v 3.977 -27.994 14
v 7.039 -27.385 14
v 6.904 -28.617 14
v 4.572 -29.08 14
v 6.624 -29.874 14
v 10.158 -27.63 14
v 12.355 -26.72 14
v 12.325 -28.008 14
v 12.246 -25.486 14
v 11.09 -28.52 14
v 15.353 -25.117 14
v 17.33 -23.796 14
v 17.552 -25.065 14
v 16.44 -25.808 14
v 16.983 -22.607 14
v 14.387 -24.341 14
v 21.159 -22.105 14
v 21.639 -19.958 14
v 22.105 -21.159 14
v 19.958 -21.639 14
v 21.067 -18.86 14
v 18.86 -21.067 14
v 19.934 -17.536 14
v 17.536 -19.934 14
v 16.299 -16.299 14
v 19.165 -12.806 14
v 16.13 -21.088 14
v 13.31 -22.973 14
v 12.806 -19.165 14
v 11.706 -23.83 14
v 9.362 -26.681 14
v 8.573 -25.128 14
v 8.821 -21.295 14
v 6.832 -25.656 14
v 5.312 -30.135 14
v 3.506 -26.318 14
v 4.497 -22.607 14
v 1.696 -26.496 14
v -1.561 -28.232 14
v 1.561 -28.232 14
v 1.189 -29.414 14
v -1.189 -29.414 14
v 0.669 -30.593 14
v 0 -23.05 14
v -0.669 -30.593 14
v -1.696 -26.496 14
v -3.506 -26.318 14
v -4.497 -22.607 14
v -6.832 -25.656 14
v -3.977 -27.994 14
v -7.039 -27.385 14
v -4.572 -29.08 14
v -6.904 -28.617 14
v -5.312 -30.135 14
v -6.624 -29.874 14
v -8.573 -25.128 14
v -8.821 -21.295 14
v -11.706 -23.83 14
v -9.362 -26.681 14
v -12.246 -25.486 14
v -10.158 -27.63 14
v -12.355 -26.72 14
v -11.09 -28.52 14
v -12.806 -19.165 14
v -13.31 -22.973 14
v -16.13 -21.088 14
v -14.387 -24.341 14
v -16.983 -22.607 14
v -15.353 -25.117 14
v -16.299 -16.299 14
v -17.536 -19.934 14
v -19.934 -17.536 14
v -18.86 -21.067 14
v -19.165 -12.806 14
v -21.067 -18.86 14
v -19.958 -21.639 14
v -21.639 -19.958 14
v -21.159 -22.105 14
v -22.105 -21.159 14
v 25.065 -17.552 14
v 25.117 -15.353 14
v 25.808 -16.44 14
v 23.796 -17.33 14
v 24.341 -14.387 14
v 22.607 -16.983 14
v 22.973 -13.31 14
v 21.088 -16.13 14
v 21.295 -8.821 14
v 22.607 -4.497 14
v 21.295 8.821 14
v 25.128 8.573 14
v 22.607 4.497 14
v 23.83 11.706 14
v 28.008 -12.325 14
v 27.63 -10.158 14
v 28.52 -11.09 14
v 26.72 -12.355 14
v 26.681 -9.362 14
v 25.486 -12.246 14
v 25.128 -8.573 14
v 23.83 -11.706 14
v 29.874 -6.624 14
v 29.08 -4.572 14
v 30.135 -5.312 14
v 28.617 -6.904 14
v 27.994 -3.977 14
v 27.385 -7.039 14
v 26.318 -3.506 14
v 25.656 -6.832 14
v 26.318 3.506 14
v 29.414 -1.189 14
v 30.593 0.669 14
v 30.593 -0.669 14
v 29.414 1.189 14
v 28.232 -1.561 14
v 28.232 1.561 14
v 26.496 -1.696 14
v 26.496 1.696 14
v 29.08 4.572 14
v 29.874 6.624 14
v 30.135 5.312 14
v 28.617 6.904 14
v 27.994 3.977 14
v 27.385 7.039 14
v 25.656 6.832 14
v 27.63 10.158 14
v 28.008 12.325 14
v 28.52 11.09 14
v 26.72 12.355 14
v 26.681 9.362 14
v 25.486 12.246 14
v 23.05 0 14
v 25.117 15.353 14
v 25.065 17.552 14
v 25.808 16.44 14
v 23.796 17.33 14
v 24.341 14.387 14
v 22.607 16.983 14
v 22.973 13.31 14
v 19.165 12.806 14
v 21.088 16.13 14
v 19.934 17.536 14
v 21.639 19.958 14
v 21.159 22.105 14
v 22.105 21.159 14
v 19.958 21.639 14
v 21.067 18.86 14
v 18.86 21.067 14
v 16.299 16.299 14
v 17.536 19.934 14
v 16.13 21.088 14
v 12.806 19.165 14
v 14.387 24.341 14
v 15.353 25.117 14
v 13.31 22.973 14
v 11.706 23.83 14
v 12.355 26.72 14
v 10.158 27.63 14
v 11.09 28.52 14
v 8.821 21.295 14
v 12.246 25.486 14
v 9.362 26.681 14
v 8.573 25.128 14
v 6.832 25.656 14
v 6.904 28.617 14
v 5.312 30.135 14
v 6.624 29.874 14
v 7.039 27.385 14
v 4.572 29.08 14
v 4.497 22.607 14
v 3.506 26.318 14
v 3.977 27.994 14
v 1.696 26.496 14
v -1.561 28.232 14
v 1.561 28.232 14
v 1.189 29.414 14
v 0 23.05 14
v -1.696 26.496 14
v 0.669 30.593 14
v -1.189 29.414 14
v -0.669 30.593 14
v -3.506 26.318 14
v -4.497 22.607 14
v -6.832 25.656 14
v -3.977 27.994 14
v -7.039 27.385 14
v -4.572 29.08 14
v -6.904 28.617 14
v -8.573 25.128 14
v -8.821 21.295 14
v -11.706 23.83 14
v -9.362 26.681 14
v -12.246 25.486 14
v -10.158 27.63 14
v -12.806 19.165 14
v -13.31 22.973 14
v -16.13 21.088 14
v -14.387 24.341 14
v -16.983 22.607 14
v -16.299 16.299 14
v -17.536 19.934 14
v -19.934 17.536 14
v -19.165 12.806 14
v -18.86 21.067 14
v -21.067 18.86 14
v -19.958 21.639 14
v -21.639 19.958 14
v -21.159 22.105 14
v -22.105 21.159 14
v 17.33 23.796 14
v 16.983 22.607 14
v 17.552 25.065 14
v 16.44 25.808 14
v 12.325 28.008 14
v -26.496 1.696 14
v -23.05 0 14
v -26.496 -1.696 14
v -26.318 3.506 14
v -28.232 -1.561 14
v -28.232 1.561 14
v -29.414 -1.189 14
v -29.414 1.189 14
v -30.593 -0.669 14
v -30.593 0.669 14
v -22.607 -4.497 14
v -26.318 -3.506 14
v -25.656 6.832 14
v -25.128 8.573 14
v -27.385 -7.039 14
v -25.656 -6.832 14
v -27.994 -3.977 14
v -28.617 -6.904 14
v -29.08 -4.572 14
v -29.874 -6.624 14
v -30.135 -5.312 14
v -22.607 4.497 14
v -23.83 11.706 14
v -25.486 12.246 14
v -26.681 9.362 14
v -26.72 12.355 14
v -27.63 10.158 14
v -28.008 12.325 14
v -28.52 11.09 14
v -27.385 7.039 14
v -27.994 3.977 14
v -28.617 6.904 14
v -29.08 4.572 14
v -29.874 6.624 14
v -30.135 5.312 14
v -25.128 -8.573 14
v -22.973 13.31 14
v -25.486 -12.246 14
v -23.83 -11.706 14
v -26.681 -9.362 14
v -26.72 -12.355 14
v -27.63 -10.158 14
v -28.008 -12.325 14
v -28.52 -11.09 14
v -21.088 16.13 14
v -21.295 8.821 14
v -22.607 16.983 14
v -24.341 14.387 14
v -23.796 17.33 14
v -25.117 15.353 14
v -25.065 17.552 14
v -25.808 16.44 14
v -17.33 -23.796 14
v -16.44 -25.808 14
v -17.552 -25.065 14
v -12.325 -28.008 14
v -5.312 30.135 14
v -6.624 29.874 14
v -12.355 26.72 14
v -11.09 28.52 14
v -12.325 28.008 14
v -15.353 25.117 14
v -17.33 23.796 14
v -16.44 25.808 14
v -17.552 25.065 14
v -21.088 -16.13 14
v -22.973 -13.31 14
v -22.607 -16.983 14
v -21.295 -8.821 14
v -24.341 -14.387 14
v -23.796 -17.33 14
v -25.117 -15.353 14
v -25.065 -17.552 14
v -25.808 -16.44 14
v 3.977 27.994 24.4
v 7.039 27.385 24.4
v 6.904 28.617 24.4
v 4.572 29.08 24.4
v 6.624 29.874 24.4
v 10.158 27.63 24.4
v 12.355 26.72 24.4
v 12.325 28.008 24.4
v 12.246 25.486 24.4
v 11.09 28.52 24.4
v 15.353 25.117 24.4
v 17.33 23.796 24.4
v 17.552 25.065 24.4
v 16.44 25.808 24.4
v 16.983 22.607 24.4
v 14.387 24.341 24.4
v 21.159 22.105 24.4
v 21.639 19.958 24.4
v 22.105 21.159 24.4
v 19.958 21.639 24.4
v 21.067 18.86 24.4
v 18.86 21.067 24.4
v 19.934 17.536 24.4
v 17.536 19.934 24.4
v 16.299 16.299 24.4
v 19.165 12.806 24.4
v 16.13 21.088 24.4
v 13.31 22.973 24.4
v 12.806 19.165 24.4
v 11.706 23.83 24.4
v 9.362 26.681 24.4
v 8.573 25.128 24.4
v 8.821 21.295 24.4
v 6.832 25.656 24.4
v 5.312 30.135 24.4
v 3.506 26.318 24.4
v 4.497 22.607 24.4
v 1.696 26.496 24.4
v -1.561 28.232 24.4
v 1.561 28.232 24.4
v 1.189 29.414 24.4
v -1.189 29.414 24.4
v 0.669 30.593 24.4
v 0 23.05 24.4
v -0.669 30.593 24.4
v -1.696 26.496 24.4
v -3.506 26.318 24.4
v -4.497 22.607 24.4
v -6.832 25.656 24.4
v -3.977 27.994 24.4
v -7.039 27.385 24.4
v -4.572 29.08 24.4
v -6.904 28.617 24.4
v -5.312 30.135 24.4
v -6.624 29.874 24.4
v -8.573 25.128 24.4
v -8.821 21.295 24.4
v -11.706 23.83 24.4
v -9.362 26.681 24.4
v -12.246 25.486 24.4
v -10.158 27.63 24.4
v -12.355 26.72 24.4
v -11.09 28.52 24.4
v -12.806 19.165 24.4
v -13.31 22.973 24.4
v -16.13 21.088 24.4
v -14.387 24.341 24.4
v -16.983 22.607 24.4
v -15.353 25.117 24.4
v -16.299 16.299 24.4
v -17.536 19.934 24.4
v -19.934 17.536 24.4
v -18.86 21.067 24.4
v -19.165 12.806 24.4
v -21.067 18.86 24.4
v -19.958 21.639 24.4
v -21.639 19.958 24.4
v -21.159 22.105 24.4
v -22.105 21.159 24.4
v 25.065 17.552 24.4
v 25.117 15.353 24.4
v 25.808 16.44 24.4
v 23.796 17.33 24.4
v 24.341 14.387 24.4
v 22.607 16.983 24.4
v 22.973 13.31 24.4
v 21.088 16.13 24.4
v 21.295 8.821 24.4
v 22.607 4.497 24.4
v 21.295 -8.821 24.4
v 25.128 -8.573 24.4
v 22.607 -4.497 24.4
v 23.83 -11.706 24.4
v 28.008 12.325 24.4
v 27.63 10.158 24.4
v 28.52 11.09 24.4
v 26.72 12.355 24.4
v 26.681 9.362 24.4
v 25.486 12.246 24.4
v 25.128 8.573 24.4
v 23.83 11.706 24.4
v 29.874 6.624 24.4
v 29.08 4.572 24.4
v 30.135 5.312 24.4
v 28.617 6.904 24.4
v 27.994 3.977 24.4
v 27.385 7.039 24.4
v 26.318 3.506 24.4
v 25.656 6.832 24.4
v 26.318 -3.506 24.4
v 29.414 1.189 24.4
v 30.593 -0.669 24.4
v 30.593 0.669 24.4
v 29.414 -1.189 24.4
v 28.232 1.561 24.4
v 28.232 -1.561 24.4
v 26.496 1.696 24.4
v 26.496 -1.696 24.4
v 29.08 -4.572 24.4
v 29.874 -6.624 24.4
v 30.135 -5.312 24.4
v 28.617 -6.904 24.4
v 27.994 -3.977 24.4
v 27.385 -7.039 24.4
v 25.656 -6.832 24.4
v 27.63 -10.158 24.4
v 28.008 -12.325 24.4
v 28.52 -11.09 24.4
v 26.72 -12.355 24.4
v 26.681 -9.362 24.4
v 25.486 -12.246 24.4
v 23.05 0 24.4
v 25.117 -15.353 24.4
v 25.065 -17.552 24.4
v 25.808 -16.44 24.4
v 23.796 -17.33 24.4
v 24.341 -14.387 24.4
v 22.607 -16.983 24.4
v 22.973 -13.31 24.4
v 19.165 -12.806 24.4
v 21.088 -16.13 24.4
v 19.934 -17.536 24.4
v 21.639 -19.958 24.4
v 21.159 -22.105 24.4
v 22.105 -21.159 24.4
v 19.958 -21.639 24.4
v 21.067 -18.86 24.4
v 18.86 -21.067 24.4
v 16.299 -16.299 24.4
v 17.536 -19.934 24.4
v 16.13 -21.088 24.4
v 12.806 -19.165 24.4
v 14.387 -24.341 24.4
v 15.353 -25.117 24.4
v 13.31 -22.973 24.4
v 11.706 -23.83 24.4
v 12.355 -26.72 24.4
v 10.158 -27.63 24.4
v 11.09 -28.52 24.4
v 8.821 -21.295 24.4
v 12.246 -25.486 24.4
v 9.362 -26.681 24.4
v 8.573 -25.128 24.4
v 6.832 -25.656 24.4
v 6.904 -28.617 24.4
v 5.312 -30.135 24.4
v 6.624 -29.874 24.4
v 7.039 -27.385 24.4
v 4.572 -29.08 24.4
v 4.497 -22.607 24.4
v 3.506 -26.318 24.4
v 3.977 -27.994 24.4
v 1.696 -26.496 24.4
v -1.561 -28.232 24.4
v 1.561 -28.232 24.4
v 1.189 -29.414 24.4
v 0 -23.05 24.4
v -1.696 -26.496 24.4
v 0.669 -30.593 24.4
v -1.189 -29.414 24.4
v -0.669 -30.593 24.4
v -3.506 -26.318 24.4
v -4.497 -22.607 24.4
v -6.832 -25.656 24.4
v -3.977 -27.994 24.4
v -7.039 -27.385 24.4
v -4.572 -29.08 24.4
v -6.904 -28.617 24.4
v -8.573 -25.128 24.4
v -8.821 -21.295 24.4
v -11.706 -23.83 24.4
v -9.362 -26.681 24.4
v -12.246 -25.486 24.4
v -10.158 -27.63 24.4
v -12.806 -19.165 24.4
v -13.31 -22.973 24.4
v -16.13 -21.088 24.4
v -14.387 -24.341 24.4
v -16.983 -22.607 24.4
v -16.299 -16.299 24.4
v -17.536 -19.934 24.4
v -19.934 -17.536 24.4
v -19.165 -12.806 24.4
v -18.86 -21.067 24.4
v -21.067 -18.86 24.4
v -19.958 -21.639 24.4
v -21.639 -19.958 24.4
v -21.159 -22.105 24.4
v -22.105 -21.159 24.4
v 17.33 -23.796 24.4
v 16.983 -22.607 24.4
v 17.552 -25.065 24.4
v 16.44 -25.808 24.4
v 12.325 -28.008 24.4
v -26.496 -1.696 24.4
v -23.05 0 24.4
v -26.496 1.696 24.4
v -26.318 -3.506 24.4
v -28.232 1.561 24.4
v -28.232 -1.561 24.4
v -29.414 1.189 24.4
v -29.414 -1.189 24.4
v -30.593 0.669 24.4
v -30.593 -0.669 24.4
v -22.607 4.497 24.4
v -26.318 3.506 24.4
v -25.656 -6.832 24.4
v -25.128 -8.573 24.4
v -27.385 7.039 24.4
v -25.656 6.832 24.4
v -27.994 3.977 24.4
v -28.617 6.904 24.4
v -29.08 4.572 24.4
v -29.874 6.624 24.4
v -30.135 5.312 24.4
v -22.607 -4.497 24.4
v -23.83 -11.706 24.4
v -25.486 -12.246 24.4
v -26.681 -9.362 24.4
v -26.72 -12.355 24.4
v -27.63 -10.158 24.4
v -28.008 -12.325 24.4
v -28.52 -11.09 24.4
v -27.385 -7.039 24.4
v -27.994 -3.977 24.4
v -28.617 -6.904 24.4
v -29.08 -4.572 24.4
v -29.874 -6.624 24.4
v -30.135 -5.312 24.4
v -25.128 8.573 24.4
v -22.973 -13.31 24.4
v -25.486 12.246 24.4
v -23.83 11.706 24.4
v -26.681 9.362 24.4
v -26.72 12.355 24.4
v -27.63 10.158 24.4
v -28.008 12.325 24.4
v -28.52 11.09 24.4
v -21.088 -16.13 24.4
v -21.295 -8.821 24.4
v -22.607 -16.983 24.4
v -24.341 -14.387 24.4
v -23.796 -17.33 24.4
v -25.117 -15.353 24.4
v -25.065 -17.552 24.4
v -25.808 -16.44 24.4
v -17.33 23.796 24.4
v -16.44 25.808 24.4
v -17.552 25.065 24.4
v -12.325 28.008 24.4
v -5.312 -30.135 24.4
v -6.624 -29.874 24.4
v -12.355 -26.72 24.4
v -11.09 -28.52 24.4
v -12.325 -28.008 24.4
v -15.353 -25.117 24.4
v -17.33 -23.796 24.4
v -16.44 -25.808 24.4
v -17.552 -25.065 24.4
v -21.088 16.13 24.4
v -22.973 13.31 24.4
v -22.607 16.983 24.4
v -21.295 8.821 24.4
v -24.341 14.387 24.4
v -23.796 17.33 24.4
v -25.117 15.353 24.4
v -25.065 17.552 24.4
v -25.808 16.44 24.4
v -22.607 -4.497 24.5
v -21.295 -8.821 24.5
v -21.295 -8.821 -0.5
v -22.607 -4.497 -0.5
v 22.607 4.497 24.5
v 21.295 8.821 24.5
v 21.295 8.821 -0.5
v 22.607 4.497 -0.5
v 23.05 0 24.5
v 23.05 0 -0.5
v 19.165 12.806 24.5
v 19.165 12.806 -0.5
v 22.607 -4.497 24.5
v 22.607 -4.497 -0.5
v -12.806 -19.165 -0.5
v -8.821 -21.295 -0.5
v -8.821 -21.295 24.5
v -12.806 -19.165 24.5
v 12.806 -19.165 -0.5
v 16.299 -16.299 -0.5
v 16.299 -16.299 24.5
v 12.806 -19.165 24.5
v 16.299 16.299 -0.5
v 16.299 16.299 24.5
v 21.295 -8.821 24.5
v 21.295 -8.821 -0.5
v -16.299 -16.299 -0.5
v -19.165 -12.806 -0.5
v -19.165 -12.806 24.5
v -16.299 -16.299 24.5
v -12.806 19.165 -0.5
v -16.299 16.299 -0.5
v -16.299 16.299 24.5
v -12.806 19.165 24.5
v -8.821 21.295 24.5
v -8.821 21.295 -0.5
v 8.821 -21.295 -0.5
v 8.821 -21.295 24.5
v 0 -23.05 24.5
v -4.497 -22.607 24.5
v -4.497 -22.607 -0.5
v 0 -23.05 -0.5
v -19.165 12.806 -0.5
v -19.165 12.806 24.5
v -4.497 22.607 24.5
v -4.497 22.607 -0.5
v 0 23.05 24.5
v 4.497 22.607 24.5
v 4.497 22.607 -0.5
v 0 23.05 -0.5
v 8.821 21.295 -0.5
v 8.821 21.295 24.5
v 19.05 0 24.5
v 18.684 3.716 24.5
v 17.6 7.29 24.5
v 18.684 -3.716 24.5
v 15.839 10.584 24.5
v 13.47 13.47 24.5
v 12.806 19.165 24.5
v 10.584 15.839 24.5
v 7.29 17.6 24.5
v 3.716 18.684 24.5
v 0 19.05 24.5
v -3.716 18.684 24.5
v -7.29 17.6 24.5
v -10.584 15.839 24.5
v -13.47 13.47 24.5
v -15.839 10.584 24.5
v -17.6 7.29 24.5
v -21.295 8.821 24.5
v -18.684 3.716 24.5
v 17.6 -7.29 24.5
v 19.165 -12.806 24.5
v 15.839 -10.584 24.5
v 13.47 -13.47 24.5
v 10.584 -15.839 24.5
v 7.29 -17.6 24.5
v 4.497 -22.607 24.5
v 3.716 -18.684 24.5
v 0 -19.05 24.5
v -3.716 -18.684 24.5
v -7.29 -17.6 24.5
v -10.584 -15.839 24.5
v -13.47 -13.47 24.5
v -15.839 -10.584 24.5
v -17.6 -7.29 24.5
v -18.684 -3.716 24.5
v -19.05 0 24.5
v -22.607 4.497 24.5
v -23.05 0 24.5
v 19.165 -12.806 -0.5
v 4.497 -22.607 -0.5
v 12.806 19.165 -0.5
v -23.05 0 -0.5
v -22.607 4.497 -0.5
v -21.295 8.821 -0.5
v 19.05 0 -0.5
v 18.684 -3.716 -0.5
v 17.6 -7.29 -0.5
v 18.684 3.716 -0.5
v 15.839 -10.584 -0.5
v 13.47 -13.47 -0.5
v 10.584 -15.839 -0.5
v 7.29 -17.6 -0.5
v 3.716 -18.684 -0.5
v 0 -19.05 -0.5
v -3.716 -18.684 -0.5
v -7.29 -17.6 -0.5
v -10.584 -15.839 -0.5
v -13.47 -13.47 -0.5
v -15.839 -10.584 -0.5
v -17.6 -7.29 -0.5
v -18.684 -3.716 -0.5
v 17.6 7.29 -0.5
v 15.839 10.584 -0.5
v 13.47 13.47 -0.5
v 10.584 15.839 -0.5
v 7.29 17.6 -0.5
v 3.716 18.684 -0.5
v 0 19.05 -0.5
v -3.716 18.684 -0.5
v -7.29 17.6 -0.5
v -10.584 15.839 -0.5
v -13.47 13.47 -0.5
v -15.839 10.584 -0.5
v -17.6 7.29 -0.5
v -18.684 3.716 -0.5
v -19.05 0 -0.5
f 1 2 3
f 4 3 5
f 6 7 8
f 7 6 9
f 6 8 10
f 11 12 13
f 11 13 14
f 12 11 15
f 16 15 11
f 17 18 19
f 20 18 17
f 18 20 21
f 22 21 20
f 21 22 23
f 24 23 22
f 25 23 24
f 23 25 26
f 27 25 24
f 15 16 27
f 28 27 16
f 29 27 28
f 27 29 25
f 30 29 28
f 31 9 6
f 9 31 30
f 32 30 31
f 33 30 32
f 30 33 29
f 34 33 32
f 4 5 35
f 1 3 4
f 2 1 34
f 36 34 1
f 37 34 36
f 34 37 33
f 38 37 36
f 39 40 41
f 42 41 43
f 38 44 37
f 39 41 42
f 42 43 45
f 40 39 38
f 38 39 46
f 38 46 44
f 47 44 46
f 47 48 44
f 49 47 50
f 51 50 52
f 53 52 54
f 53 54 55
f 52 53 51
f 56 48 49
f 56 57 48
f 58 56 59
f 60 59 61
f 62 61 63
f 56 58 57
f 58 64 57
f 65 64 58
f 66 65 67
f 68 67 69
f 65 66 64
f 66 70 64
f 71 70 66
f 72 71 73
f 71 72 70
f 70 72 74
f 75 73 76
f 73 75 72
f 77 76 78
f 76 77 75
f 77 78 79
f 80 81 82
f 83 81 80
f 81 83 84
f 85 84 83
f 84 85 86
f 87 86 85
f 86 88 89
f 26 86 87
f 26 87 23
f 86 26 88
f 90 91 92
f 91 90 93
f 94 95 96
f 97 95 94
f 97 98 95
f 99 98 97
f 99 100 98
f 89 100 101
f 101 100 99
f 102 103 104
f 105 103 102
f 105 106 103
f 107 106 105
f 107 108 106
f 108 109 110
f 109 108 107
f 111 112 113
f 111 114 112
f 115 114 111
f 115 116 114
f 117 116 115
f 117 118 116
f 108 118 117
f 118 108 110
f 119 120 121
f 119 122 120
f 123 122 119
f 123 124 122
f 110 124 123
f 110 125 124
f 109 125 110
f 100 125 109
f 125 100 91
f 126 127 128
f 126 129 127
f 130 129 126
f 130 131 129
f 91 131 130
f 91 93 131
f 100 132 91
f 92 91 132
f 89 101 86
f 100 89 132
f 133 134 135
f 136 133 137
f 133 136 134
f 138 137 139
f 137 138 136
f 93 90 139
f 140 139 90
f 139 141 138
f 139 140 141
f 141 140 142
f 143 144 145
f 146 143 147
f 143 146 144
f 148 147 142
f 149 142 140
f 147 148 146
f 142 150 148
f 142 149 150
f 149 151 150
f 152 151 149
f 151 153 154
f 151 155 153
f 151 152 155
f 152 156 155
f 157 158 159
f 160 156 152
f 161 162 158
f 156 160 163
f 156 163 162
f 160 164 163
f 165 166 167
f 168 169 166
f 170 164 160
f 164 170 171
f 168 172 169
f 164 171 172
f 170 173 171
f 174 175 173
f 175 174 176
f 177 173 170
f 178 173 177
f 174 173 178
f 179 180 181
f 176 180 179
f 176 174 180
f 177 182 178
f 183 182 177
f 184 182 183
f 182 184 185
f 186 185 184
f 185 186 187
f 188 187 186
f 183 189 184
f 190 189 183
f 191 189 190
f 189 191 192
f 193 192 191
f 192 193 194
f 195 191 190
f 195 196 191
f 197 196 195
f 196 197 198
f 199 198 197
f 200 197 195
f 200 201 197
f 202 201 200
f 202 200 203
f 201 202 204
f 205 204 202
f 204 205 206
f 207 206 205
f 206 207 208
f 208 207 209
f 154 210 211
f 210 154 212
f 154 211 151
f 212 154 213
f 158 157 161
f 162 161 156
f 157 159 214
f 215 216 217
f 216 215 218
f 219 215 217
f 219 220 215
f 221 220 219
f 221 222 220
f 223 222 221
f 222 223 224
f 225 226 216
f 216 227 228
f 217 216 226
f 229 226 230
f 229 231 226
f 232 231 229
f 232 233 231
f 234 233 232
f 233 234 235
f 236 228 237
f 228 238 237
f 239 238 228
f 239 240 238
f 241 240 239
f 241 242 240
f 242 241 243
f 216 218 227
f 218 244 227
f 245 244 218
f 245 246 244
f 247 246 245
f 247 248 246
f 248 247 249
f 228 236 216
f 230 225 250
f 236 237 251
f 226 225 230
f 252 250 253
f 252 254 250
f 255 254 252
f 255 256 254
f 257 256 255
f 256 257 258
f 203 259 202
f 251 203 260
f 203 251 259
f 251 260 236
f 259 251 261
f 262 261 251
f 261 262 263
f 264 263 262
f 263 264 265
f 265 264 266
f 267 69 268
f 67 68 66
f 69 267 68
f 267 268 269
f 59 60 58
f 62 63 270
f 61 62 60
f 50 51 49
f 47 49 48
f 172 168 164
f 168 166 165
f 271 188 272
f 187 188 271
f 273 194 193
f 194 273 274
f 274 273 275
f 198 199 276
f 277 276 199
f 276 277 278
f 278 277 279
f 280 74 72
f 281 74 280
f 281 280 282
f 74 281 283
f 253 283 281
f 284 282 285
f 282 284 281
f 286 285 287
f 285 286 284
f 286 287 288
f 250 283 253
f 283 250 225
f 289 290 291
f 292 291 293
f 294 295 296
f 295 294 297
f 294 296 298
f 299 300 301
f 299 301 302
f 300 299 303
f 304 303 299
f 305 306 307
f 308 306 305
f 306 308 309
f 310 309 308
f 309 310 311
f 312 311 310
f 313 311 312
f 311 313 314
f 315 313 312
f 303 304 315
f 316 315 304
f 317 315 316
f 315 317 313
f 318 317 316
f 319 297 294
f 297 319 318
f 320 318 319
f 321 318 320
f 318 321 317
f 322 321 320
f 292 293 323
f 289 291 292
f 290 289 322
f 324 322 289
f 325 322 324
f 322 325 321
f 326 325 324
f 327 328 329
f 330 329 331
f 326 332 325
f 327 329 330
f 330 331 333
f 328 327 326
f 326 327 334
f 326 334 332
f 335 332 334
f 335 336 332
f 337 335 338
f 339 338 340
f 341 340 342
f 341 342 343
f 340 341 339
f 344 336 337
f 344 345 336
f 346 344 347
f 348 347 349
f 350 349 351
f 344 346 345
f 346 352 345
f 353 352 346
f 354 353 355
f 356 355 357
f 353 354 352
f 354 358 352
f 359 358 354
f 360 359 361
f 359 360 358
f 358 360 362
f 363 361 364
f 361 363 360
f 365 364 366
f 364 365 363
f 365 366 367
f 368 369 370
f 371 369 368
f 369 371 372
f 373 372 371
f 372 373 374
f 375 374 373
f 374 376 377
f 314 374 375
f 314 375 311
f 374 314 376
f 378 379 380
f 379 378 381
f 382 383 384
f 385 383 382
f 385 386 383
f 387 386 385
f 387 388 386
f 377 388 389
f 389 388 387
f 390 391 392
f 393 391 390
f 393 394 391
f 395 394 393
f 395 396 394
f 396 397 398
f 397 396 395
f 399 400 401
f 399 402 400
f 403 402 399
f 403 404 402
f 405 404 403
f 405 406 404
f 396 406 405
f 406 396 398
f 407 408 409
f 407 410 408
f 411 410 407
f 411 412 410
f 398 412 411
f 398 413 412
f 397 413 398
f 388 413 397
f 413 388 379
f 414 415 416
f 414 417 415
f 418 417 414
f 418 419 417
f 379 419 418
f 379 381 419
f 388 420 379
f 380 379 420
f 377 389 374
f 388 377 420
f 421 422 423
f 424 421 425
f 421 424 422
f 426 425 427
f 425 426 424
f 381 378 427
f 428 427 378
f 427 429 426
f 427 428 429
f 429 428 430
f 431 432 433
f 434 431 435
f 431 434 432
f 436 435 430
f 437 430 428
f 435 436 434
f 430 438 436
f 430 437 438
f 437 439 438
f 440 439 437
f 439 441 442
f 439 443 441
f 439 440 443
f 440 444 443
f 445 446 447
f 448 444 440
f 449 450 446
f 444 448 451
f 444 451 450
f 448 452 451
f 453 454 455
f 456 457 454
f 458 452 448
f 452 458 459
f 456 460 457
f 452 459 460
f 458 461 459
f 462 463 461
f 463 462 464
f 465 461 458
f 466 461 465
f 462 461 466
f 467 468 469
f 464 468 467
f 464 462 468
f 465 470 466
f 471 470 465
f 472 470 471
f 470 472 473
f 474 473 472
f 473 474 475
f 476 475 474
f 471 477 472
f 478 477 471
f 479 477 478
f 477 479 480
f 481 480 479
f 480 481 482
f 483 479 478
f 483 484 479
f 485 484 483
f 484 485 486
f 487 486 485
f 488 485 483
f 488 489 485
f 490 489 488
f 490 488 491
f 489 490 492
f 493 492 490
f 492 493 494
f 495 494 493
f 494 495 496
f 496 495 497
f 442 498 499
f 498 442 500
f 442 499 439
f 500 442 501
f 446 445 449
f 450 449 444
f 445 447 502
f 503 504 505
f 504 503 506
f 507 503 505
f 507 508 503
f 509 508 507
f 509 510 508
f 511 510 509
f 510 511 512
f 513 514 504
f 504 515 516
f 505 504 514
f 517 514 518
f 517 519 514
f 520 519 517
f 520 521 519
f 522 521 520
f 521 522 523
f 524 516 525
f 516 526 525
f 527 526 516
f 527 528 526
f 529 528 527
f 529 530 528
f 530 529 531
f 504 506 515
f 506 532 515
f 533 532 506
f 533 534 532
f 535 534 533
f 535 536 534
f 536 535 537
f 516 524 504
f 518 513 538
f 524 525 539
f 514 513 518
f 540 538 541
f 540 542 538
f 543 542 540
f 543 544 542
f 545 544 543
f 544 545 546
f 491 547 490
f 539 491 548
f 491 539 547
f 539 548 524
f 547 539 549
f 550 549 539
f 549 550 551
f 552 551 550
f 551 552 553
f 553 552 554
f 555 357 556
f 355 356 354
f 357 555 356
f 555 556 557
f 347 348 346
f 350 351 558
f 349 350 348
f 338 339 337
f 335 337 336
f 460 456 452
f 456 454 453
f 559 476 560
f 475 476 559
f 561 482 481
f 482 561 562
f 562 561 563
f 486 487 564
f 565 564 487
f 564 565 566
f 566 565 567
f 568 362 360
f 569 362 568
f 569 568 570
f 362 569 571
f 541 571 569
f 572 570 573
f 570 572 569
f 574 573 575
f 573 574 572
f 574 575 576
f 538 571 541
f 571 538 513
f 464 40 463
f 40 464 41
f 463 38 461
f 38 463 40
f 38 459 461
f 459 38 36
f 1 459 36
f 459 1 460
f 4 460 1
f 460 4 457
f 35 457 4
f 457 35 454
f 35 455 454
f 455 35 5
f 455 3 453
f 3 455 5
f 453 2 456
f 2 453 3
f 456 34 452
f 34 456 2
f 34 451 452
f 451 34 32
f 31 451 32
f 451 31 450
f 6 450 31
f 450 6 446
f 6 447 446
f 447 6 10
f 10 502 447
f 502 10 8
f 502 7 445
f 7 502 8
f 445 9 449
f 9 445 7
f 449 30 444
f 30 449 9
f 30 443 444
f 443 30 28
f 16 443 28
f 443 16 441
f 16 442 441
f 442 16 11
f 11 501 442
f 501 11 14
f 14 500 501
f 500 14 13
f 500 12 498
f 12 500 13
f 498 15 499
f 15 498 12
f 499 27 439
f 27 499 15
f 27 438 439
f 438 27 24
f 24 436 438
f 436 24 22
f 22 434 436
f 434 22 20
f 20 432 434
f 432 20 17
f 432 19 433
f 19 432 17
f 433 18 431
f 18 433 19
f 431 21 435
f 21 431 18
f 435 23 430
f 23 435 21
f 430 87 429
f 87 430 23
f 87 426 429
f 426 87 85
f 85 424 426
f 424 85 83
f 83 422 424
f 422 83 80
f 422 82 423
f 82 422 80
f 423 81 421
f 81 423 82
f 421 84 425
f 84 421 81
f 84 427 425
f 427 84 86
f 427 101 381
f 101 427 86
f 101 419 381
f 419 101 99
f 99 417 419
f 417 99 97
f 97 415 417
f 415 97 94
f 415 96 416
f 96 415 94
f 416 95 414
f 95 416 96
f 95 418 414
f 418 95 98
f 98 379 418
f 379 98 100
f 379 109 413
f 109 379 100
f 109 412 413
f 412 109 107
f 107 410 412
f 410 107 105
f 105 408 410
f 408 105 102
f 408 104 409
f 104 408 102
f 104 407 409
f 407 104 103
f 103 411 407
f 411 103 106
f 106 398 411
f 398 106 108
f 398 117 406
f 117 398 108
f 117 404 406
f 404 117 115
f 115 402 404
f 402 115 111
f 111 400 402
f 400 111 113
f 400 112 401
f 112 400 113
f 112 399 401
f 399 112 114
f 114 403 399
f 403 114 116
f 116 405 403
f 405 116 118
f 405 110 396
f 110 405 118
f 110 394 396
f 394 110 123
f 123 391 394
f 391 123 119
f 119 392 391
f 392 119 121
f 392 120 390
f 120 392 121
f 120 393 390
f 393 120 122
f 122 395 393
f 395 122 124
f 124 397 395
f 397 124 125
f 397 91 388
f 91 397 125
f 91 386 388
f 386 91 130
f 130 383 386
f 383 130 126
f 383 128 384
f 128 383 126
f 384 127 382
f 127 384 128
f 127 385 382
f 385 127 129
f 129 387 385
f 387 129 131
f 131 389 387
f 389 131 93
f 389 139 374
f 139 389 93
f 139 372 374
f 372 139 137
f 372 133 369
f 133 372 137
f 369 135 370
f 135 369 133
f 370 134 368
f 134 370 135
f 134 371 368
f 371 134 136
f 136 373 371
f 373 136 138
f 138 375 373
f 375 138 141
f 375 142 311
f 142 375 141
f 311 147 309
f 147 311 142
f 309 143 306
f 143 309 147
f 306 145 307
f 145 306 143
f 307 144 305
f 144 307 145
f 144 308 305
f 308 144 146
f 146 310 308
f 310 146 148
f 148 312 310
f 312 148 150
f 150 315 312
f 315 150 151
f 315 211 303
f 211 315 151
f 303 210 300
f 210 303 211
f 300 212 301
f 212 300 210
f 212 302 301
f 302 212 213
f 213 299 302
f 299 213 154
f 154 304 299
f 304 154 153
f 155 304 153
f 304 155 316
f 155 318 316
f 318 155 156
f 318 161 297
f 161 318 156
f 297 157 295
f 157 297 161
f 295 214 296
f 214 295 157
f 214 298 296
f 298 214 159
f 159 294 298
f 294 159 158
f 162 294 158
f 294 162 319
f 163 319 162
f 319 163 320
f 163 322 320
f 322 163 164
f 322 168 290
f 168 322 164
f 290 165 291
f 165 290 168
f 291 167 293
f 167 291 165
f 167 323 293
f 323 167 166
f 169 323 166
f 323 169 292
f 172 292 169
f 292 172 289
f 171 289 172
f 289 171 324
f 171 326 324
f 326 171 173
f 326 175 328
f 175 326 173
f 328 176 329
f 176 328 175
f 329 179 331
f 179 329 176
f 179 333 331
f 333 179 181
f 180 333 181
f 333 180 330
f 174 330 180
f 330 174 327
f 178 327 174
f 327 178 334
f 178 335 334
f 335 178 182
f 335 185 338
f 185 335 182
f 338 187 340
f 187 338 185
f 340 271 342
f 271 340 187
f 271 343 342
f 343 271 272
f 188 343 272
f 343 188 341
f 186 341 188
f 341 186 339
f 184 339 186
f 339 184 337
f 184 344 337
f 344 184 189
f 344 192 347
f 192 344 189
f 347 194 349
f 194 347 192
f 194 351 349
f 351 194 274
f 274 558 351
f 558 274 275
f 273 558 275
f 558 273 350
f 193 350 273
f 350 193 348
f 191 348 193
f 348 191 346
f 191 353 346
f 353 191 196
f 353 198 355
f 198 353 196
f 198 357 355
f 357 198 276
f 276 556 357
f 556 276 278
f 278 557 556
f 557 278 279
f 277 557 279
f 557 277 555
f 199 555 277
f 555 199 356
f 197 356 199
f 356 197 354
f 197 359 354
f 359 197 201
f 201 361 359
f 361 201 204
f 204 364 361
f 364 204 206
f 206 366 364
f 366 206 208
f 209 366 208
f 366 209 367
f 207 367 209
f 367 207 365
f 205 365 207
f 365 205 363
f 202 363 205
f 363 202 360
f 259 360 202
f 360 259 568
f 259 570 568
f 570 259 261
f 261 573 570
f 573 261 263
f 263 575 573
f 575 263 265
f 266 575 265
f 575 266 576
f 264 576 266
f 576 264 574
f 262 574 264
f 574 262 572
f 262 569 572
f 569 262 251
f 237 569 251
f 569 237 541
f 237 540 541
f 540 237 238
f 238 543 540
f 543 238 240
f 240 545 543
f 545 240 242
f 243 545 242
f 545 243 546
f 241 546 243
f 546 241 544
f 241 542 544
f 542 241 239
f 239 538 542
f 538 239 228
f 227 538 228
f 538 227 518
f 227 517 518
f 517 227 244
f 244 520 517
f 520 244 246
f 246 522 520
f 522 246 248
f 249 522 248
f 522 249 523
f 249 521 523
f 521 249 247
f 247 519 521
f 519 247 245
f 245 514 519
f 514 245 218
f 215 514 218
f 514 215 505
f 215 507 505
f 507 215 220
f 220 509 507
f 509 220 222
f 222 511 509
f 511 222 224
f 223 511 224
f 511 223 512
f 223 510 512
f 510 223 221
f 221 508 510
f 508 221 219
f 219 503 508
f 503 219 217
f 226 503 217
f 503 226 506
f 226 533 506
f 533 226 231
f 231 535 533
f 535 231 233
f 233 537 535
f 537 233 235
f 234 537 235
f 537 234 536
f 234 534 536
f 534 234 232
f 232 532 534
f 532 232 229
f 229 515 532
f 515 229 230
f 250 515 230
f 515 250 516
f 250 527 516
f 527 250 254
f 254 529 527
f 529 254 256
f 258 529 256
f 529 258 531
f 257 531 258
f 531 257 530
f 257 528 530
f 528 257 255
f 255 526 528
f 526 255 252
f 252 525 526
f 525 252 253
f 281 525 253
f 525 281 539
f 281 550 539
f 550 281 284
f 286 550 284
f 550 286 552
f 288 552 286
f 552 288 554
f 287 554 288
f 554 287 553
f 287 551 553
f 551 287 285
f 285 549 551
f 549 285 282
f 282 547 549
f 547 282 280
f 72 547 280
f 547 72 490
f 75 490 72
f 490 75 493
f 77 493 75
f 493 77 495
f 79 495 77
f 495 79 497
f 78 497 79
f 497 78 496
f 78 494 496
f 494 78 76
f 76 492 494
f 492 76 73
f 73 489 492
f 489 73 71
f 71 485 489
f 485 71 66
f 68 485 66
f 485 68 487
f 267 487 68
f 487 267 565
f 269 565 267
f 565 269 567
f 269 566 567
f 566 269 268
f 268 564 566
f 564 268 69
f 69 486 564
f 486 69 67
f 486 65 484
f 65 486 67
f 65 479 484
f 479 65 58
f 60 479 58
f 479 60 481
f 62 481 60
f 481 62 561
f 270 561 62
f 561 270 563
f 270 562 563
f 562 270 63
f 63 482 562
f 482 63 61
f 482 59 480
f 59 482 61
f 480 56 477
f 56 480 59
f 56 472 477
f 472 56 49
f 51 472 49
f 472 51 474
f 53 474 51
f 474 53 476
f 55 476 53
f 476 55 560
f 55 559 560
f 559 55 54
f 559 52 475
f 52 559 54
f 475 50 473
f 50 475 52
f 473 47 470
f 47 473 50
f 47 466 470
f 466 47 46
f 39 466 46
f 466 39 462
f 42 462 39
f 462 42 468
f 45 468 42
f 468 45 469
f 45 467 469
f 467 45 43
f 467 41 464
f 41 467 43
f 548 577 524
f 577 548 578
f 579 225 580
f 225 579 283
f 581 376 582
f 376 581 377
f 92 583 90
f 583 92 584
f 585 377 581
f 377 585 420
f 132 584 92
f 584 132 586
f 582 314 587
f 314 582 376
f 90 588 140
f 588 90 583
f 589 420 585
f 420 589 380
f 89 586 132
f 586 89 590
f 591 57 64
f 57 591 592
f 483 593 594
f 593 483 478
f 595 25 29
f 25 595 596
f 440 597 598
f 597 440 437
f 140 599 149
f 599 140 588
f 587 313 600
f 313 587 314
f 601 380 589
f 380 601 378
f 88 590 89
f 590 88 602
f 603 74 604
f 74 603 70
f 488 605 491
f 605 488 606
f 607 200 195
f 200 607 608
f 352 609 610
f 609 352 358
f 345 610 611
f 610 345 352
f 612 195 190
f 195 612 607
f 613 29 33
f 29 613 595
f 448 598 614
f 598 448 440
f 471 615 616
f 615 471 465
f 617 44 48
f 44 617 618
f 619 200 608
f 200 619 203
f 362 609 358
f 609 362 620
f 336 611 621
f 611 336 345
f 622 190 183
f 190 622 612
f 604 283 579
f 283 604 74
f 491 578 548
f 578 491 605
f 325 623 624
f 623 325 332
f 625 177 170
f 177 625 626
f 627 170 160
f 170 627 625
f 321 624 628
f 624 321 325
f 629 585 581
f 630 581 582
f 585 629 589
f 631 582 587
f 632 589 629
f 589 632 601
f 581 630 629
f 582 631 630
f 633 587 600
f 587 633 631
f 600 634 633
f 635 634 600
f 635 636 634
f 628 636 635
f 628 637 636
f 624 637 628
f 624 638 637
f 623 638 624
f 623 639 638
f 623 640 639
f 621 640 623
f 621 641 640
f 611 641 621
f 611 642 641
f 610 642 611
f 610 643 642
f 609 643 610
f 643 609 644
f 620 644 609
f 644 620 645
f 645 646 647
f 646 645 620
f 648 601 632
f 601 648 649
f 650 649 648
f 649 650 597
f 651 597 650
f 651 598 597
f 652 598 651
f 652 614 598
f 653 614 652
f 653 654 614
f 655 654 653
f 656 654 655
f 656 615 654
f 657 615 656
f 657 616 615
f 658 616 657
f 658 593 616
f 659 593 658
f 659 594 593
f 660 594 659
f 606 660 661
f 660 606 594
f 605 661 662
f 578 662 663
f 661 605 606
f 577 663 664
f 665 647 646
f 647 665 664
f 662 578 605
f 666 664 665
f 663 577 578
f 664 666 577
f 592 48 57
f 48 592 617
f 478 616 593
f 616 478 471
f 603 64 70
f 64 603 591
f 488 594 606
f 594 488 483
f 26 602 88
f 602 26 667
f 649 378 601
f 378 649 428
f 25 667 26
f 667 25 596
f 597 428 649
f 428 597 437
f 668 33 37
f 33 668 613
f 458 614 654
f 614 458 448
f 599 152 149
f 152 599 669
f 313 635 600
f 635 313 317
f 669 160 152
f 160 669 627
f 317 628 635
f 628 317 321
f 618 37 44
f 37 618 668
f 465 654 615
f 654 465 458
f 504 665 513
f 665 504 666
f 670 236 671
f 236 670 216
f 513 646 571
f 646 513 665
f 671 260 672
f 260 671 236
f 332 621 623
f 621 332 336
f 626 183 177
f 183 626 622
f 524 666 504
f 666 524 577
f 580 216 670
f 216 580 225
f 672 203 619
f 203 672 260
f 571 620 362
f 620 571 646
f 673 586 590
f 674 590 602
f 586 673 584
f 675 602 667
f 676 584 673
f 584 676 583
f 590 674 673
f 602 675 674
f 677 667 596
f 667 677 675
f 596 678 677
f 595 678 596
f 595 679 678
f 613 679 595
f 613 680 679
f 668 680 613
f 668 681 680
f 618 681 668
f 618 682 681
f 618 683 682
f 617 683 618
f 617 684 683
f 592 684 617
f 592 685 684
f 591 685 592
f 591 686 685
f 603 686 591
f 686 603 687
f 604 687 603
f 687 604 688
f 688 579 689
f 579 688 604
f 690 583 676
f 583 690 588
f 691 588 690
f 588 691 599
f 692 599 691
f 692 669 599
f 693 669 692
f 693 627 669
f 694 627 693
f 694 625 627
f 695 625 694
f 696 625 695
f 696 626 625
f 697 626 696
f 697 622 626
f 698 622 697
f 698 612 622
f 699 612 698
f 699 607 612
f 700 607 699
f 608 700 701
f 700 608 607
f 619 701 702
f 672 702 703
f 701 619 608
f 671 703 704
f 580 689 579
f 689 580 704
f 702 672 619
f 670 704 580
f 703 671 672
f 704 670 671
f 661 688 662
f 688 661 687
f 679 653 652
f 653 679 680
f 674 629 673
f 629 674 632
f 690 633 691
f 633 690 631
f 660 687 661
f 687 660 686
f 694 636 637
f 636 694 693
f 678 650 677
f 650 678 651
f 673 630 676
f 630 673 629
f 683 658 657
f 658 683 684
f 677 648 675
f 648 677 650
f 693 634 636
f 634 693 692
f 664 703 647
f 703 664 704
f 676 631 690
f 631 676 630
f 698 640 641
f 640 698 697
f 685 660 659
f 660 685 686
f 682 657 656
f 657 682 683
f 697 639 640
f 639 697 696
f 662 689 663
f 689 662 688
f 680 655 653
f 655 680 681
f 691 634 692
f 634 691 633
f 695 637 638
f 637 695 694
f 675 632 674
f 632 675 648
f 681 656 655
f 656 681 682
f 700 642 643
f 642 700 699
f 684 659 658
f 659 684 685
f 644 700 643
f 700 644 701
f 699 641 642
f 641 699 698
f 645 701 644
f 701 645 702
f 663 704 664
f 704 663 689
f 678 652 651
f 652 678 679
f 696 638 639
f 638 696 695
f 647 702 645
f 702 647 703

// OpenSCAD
$fn = 32;

// ----------------------------------------------------------------------
// Two-module gear rim: z12 m3 and z32 m1.8, 24 mm wide
// ----------------------------------------------------------------------

// --- parameters (mm) ---
module_a = 3;             // first tooth module
teeth_a = 12;             // first band tooth count
module_b = 1.8;           // second tooth module
teeth_b = 32;             // second band tooth count
band_h = 10;              // height of one tooth band
web_t = 4;                // web thickness between the bands
total = 24;               // overall width over both bands
root_r = 14.25;           // root radius of the coarse band
hub_r = 23.05;            // hub radius
bore_d = 38.1;            // hub bore
hole_count = 4;           // lightening holes
hole_r = 11.62;           // lightening hole circle radius
hole_d = 4;               // lightening hole diameter

band_a = [[14.099, -2.068], [18.168, -2.269], [19.578, -1.734], [20.979, -0.931], [20.979, 0.931], [19.578, 1.734], [18.168, 2.269], [14.099, 2.068], [13.244, 5.258], [16.869, 7.119], [17.822, 8.287], [18.634, 9.683], [17.703, 11.296], [16.088, 11.291], [14.6, 11.049], [11.176, 8.841], [8.841, 11.176], [11.049, 14.6], [11.291, 16.088], [11.296, 17.703], [9.683, 18.634], [8.287, 17.822], [7.119, 16.869], [5.258, 13.244], [2.068, 14.099], [2.269, 18.168], [1.734, 19.578], [0.931, 20.979], [-0.931, 20.979], [-1.734, 19.578], [-2.269, 18.168], [-2.068, 14.099], [-5.258, 13.244], [-7.119, 16.869], [-8.287, 17.822], [-9.683, 18.634], [-11.296, 17.703], [-11.291, 16.088], [-11.049, 14.6], [-8.841, 11.176], [-11.176, 8.841], [-14.6, 11.049], [-16.088, 11.291], [-17.703, 11.296], [-18.634, 9.683], [-17.822, 8.287], [-16.869, 7.119], [-13.244, 5.258], [-14.099, 2.068], [-18.168, 2.269], [-19.578, 1.734], [-20.979, 0.931], [-20.979, -0.931], [-19.578, -1.734], [-18.168, -2.269], [-14.099, -2.068], [-13.244, -5.258], [-16.869, -7.119], [-17.822, -8.287], [-18.634, -9.683], [-17.703, -11.296], [-16.088, -11.291], [-14.6, -11.049], [-11.176, -8.841], [-8.841, -11.176], [-11.049, -14.6], [-11.291, -16.088], [-11.296, -17.703], [-9.683, -18.634], [-8.287, -17.822], [-7.119, -16.869], [-5.258, -13.244], [-2.068, -14.099], [-2.269, -18.168], [-1.734, -19.578], [-0.931, -20.979], [0.931, -20.979], [1.734, -19.578], [2.269, -18.168], [2.068, -14.099], [5.258, -13.244], [7.119, -16.869], [8.287, -17.822], [9.683, -18.634], [11.296, -17.703], [11.291, -16.088], [11.049, -14.6], [8.841, -11.176], [11.176, -8.841], [14.6, -11.049], [16.088, -11.291], [17.703, -11.296], [18.634, -9.683], [17.822, -8.287], [16.869, -7.119], [13.244, -5.258]];
band_b = [[26.496, -1.696], [28.232, -1.561], [29.414, -1.189], [30.593, -0.669], [30.593, 0.669], [29.414, 1.189], [28.232, 1.561], [26.496, 1.696], [26.318, 3.506], [27.994, 3.977], [29.08, 4.572], [30.135, 5.312], [29.874, 6.624], [28.617, 6.904], [27.385, 7.039], [25.656, 6.832], [25.128, 8.573], [26.681, 9.362], [27.63, 10.158], [28.52, 11.09], [28.008, 12.325], [26.72, 12.355], [25.486, 12.246], [23.83, 11.706], [22.973, 13.31], [24.341, 14.387], [25.117, 15.353], [25.808, 16.44], [25.065, 17.552], [23.796, 17.33], [22.607, 16.983], [21.088, 16.13], [19.934, 17.536], [21.067, 18.86], [21.639, 19.958], [22.105, 21.159], [21.159, 22.105], [19.958, 21.639], [18.86, 21.067], [17.536, 19.934], [16.13, 21.088], [16.983, 22.607], [17.33, 23.796], [17.552, 25.065], [16.44, 25.808], [15.353, 25.117], [14.387, 24.341], [13.31, 22.973], [11.706, 23.83], [12.246, 25.486], [12.355, 26.72], [12.325, 28.008], [11.09, 28.52], [10.158, 27.63], [9.362, 26.681], [8.573, 25.128], [6.832, 25.656], [7.039, 27.385], [6.904, 28.617], [6.624, 29.874], [5.312, 30.135], [4.572, 29.08], [3.977, 27.994], [3.506, 26.318], [1.696, 26.496], [1.561, 28.232], [1.189, 29.414], [0.669, 30.593], [-0.669, 30.593], [-1.189, 29.414], [-1.561, 28.232], [-1.696, 26.496], [-3.506, 26.318], [-3.977, 27.994], [-4.572, 29.08], [-5.312, 30.135], [-6.624, 29.874], [-6.904, 28.617], [-7.039, 27.385], [-6.832, 25.656], [-8.573, 25.128], [-9.362, 26.681], [-10.158, 27.63], [-11.09, 28.52], [-12.325, 28.008], [-12.355, 26.72], [-12.246, 25.486], [-11.706, 23.83], [-13.31, 22.973], [-14.387, 24.341], [-15.353, 25.117], [-16.44, 25.808], [-17.552, 25.065], [-17.33, 23.796], [-16.983, 22.607], [-16.13, 21.088], [-17.536, 19.934], [-18.86, 21.067], [-19.958, 21.639], [-21.159, 22.105], [-22.105, 21.159], [-21.639, 19.958], [-21.067, 18.86], [-19.934, 17.536], [-21.088, 16.13], [-22.607, 16.983], [-23.796, 17.33], [-25.065, 17.552], [-25.808, 16.44], [-25.117, 15.353], [-24.341, 14.387], [-22.973, 13.31], [-23.83, 11.706], [-25.486, 12.246], [-26.72, 12.355], [-28.008, 12.325], [-28.52, 11.09], [-27.63, 10.158], [-26.681, 9.362], [-25.128, 8.573], [-25.656, 6.832], [-27.385, 7.039], [-28.617, 6.904], [-29.874, 6.624], [-30.135, 5.312], [-29.08, 4.572], [-27.994, 3.977], [-26.318, 3.506], [-26.496, 1.696], [-28.232, 1.561], [-29.414, 1.189], [-30.593, 0.669], [-30.593, -0.669], [-29.414, -1.189], [-28.232, -1.561], [-26.496, -1.696], [-26.318, -3.506], [-27.994, -3.977], [-29.08, -4.572], [-30.135, -5.312], [-29.874, -6.624], [-28.617, -6.904], [-27.385, -7.039], [-25.656, -6.832], [-25.128, -8.573], [-26.681, -9.362], [-27.63, -10.158], [-28.52, -11.09], [-28.008, -12.325], [-26.72, -12.355], [-25.486, -12.246], [-23.83, -11.706], [-22.973, -13.31], [-24.341, -14.387], [-25.117, -15.353], [-25.808, -16.44], [-25.065, -17.552], [-23.796, -17.33], [-22.607, -16.983], [-21.088, -16.13], [-19.934, -17.536], [-21.067, -18.86], [-21.639, -19.958], [-22.105, -21.159], [-21.159, -22.105], [-19.958, -21.639], [-18.86, -21.067], [-17.536, -19.934], [-16.13, -21.088], [-16.983, -22.607], [-17.33, -23.796], [-17.552, -25.065], [-16.44, -25.808], [-15.353, -25.117], [-14.387, -24.341], [-13.31, -22.973], [-11.706, -23.83], [-12.246, -25.486], [-12.355, -26.72], [-12.325, -28.008], [-11.09, -28.52], [-10.158, -27.63], [-9.362, -26.681], [-8.573, -25.128], [-6.832, -25.656], [-7.039, -27.385], [-6.904, -28.617], [-6.624, -29.874], [-5.312, -30.135], [-4.572, -29.08], [-3.977, -27.994], [-3.506, -26.318], [-1.696, -26.496], [-1.561, -28.232], [-1.189, -29.414], [-0.669, -30.593], [0.669, -30.593], [1.189, -29.414], [1.561, -28.232], [1.696, -26.496], [3.506, -26.318], [3.977, -27.994], [4.572, -29.08], [5.312, -30.135], [6.624, -29.874], [6.904, -28.617], [7.039, -27.385], [6.832, -25.656], [8.573, -25.128], [9.362, -26.681], [10.158, -27.63], [11.09, -28.52], [12.325, -28.008], [12.355, -26.72], [12.246, -25.486], [11.706, -23.83], [13.31, -22.973], [14.387, -24.341], [15.353, -25.117], [16.44, -25.808], [17.552, -25.065], [17.33, -23.796], [16.983, -22.607], [16.13, -21.088], [17.536, -19.934], [18.86, -21.067], [19.958, -21.639], [21.159, -22.105], [22.105, -21.159], [21.639, -19.958], [21.067, -18.86], [19.934, -17.536], [21.088, -16.13], [22.607, -16.983], [23.796, -17.33], [25.065, -17.552], [25.808, -16.44], [25.117, -15.353], [24.341, -14.387], [22.973, -13.31], [23.83, -11.706], [25.486, -12.246], [26.72, -12.355], [28.008, -12.325], [28.52, -11.09], [27.63, -10.158], [26.681, -9.362], [25.128, -8.573], [25.656, -6.832], [27.385, -7.039], [28.617, -6.904], [29.874, -6.624], [30.135, -5.312], [29.08, -4.572], [27.994, -3.977], [26.318, -3.506]];

difference() {
  union() {
    /* tooth band A, overlapping the web by 0.4 mm */
    linear_extrude(height = band_h + 0.4) polygon(band_a);
    /* web */
    translate([0, 0, band_h - 0.4]) cylinder(h = web_t + 0.8, d = 2 * root_r);
    /* tooth band B */
    translate([0, 0, band_h + web_t]) linear_extrude(height = band_h + 0.4) polygon(band_b);
    /* hub */
    translate([0, 0, -0.5]) cylinder(h = total + 1.0, d = 2 * hub_r);
  }
  /* bore */
  translate([0, 0, -2.5]) cylinder(h = total + 5, d = bore_d);
  /* lightening holes through the web */
  for (i = [0 : hole_count - 1]) {
    a = i * 360 / hole_count;
    translate([hole_r * cos(a), hole_r * sin(a), -2.5]) cylinder(h = total + 5, d = hole_d);
  }
}
